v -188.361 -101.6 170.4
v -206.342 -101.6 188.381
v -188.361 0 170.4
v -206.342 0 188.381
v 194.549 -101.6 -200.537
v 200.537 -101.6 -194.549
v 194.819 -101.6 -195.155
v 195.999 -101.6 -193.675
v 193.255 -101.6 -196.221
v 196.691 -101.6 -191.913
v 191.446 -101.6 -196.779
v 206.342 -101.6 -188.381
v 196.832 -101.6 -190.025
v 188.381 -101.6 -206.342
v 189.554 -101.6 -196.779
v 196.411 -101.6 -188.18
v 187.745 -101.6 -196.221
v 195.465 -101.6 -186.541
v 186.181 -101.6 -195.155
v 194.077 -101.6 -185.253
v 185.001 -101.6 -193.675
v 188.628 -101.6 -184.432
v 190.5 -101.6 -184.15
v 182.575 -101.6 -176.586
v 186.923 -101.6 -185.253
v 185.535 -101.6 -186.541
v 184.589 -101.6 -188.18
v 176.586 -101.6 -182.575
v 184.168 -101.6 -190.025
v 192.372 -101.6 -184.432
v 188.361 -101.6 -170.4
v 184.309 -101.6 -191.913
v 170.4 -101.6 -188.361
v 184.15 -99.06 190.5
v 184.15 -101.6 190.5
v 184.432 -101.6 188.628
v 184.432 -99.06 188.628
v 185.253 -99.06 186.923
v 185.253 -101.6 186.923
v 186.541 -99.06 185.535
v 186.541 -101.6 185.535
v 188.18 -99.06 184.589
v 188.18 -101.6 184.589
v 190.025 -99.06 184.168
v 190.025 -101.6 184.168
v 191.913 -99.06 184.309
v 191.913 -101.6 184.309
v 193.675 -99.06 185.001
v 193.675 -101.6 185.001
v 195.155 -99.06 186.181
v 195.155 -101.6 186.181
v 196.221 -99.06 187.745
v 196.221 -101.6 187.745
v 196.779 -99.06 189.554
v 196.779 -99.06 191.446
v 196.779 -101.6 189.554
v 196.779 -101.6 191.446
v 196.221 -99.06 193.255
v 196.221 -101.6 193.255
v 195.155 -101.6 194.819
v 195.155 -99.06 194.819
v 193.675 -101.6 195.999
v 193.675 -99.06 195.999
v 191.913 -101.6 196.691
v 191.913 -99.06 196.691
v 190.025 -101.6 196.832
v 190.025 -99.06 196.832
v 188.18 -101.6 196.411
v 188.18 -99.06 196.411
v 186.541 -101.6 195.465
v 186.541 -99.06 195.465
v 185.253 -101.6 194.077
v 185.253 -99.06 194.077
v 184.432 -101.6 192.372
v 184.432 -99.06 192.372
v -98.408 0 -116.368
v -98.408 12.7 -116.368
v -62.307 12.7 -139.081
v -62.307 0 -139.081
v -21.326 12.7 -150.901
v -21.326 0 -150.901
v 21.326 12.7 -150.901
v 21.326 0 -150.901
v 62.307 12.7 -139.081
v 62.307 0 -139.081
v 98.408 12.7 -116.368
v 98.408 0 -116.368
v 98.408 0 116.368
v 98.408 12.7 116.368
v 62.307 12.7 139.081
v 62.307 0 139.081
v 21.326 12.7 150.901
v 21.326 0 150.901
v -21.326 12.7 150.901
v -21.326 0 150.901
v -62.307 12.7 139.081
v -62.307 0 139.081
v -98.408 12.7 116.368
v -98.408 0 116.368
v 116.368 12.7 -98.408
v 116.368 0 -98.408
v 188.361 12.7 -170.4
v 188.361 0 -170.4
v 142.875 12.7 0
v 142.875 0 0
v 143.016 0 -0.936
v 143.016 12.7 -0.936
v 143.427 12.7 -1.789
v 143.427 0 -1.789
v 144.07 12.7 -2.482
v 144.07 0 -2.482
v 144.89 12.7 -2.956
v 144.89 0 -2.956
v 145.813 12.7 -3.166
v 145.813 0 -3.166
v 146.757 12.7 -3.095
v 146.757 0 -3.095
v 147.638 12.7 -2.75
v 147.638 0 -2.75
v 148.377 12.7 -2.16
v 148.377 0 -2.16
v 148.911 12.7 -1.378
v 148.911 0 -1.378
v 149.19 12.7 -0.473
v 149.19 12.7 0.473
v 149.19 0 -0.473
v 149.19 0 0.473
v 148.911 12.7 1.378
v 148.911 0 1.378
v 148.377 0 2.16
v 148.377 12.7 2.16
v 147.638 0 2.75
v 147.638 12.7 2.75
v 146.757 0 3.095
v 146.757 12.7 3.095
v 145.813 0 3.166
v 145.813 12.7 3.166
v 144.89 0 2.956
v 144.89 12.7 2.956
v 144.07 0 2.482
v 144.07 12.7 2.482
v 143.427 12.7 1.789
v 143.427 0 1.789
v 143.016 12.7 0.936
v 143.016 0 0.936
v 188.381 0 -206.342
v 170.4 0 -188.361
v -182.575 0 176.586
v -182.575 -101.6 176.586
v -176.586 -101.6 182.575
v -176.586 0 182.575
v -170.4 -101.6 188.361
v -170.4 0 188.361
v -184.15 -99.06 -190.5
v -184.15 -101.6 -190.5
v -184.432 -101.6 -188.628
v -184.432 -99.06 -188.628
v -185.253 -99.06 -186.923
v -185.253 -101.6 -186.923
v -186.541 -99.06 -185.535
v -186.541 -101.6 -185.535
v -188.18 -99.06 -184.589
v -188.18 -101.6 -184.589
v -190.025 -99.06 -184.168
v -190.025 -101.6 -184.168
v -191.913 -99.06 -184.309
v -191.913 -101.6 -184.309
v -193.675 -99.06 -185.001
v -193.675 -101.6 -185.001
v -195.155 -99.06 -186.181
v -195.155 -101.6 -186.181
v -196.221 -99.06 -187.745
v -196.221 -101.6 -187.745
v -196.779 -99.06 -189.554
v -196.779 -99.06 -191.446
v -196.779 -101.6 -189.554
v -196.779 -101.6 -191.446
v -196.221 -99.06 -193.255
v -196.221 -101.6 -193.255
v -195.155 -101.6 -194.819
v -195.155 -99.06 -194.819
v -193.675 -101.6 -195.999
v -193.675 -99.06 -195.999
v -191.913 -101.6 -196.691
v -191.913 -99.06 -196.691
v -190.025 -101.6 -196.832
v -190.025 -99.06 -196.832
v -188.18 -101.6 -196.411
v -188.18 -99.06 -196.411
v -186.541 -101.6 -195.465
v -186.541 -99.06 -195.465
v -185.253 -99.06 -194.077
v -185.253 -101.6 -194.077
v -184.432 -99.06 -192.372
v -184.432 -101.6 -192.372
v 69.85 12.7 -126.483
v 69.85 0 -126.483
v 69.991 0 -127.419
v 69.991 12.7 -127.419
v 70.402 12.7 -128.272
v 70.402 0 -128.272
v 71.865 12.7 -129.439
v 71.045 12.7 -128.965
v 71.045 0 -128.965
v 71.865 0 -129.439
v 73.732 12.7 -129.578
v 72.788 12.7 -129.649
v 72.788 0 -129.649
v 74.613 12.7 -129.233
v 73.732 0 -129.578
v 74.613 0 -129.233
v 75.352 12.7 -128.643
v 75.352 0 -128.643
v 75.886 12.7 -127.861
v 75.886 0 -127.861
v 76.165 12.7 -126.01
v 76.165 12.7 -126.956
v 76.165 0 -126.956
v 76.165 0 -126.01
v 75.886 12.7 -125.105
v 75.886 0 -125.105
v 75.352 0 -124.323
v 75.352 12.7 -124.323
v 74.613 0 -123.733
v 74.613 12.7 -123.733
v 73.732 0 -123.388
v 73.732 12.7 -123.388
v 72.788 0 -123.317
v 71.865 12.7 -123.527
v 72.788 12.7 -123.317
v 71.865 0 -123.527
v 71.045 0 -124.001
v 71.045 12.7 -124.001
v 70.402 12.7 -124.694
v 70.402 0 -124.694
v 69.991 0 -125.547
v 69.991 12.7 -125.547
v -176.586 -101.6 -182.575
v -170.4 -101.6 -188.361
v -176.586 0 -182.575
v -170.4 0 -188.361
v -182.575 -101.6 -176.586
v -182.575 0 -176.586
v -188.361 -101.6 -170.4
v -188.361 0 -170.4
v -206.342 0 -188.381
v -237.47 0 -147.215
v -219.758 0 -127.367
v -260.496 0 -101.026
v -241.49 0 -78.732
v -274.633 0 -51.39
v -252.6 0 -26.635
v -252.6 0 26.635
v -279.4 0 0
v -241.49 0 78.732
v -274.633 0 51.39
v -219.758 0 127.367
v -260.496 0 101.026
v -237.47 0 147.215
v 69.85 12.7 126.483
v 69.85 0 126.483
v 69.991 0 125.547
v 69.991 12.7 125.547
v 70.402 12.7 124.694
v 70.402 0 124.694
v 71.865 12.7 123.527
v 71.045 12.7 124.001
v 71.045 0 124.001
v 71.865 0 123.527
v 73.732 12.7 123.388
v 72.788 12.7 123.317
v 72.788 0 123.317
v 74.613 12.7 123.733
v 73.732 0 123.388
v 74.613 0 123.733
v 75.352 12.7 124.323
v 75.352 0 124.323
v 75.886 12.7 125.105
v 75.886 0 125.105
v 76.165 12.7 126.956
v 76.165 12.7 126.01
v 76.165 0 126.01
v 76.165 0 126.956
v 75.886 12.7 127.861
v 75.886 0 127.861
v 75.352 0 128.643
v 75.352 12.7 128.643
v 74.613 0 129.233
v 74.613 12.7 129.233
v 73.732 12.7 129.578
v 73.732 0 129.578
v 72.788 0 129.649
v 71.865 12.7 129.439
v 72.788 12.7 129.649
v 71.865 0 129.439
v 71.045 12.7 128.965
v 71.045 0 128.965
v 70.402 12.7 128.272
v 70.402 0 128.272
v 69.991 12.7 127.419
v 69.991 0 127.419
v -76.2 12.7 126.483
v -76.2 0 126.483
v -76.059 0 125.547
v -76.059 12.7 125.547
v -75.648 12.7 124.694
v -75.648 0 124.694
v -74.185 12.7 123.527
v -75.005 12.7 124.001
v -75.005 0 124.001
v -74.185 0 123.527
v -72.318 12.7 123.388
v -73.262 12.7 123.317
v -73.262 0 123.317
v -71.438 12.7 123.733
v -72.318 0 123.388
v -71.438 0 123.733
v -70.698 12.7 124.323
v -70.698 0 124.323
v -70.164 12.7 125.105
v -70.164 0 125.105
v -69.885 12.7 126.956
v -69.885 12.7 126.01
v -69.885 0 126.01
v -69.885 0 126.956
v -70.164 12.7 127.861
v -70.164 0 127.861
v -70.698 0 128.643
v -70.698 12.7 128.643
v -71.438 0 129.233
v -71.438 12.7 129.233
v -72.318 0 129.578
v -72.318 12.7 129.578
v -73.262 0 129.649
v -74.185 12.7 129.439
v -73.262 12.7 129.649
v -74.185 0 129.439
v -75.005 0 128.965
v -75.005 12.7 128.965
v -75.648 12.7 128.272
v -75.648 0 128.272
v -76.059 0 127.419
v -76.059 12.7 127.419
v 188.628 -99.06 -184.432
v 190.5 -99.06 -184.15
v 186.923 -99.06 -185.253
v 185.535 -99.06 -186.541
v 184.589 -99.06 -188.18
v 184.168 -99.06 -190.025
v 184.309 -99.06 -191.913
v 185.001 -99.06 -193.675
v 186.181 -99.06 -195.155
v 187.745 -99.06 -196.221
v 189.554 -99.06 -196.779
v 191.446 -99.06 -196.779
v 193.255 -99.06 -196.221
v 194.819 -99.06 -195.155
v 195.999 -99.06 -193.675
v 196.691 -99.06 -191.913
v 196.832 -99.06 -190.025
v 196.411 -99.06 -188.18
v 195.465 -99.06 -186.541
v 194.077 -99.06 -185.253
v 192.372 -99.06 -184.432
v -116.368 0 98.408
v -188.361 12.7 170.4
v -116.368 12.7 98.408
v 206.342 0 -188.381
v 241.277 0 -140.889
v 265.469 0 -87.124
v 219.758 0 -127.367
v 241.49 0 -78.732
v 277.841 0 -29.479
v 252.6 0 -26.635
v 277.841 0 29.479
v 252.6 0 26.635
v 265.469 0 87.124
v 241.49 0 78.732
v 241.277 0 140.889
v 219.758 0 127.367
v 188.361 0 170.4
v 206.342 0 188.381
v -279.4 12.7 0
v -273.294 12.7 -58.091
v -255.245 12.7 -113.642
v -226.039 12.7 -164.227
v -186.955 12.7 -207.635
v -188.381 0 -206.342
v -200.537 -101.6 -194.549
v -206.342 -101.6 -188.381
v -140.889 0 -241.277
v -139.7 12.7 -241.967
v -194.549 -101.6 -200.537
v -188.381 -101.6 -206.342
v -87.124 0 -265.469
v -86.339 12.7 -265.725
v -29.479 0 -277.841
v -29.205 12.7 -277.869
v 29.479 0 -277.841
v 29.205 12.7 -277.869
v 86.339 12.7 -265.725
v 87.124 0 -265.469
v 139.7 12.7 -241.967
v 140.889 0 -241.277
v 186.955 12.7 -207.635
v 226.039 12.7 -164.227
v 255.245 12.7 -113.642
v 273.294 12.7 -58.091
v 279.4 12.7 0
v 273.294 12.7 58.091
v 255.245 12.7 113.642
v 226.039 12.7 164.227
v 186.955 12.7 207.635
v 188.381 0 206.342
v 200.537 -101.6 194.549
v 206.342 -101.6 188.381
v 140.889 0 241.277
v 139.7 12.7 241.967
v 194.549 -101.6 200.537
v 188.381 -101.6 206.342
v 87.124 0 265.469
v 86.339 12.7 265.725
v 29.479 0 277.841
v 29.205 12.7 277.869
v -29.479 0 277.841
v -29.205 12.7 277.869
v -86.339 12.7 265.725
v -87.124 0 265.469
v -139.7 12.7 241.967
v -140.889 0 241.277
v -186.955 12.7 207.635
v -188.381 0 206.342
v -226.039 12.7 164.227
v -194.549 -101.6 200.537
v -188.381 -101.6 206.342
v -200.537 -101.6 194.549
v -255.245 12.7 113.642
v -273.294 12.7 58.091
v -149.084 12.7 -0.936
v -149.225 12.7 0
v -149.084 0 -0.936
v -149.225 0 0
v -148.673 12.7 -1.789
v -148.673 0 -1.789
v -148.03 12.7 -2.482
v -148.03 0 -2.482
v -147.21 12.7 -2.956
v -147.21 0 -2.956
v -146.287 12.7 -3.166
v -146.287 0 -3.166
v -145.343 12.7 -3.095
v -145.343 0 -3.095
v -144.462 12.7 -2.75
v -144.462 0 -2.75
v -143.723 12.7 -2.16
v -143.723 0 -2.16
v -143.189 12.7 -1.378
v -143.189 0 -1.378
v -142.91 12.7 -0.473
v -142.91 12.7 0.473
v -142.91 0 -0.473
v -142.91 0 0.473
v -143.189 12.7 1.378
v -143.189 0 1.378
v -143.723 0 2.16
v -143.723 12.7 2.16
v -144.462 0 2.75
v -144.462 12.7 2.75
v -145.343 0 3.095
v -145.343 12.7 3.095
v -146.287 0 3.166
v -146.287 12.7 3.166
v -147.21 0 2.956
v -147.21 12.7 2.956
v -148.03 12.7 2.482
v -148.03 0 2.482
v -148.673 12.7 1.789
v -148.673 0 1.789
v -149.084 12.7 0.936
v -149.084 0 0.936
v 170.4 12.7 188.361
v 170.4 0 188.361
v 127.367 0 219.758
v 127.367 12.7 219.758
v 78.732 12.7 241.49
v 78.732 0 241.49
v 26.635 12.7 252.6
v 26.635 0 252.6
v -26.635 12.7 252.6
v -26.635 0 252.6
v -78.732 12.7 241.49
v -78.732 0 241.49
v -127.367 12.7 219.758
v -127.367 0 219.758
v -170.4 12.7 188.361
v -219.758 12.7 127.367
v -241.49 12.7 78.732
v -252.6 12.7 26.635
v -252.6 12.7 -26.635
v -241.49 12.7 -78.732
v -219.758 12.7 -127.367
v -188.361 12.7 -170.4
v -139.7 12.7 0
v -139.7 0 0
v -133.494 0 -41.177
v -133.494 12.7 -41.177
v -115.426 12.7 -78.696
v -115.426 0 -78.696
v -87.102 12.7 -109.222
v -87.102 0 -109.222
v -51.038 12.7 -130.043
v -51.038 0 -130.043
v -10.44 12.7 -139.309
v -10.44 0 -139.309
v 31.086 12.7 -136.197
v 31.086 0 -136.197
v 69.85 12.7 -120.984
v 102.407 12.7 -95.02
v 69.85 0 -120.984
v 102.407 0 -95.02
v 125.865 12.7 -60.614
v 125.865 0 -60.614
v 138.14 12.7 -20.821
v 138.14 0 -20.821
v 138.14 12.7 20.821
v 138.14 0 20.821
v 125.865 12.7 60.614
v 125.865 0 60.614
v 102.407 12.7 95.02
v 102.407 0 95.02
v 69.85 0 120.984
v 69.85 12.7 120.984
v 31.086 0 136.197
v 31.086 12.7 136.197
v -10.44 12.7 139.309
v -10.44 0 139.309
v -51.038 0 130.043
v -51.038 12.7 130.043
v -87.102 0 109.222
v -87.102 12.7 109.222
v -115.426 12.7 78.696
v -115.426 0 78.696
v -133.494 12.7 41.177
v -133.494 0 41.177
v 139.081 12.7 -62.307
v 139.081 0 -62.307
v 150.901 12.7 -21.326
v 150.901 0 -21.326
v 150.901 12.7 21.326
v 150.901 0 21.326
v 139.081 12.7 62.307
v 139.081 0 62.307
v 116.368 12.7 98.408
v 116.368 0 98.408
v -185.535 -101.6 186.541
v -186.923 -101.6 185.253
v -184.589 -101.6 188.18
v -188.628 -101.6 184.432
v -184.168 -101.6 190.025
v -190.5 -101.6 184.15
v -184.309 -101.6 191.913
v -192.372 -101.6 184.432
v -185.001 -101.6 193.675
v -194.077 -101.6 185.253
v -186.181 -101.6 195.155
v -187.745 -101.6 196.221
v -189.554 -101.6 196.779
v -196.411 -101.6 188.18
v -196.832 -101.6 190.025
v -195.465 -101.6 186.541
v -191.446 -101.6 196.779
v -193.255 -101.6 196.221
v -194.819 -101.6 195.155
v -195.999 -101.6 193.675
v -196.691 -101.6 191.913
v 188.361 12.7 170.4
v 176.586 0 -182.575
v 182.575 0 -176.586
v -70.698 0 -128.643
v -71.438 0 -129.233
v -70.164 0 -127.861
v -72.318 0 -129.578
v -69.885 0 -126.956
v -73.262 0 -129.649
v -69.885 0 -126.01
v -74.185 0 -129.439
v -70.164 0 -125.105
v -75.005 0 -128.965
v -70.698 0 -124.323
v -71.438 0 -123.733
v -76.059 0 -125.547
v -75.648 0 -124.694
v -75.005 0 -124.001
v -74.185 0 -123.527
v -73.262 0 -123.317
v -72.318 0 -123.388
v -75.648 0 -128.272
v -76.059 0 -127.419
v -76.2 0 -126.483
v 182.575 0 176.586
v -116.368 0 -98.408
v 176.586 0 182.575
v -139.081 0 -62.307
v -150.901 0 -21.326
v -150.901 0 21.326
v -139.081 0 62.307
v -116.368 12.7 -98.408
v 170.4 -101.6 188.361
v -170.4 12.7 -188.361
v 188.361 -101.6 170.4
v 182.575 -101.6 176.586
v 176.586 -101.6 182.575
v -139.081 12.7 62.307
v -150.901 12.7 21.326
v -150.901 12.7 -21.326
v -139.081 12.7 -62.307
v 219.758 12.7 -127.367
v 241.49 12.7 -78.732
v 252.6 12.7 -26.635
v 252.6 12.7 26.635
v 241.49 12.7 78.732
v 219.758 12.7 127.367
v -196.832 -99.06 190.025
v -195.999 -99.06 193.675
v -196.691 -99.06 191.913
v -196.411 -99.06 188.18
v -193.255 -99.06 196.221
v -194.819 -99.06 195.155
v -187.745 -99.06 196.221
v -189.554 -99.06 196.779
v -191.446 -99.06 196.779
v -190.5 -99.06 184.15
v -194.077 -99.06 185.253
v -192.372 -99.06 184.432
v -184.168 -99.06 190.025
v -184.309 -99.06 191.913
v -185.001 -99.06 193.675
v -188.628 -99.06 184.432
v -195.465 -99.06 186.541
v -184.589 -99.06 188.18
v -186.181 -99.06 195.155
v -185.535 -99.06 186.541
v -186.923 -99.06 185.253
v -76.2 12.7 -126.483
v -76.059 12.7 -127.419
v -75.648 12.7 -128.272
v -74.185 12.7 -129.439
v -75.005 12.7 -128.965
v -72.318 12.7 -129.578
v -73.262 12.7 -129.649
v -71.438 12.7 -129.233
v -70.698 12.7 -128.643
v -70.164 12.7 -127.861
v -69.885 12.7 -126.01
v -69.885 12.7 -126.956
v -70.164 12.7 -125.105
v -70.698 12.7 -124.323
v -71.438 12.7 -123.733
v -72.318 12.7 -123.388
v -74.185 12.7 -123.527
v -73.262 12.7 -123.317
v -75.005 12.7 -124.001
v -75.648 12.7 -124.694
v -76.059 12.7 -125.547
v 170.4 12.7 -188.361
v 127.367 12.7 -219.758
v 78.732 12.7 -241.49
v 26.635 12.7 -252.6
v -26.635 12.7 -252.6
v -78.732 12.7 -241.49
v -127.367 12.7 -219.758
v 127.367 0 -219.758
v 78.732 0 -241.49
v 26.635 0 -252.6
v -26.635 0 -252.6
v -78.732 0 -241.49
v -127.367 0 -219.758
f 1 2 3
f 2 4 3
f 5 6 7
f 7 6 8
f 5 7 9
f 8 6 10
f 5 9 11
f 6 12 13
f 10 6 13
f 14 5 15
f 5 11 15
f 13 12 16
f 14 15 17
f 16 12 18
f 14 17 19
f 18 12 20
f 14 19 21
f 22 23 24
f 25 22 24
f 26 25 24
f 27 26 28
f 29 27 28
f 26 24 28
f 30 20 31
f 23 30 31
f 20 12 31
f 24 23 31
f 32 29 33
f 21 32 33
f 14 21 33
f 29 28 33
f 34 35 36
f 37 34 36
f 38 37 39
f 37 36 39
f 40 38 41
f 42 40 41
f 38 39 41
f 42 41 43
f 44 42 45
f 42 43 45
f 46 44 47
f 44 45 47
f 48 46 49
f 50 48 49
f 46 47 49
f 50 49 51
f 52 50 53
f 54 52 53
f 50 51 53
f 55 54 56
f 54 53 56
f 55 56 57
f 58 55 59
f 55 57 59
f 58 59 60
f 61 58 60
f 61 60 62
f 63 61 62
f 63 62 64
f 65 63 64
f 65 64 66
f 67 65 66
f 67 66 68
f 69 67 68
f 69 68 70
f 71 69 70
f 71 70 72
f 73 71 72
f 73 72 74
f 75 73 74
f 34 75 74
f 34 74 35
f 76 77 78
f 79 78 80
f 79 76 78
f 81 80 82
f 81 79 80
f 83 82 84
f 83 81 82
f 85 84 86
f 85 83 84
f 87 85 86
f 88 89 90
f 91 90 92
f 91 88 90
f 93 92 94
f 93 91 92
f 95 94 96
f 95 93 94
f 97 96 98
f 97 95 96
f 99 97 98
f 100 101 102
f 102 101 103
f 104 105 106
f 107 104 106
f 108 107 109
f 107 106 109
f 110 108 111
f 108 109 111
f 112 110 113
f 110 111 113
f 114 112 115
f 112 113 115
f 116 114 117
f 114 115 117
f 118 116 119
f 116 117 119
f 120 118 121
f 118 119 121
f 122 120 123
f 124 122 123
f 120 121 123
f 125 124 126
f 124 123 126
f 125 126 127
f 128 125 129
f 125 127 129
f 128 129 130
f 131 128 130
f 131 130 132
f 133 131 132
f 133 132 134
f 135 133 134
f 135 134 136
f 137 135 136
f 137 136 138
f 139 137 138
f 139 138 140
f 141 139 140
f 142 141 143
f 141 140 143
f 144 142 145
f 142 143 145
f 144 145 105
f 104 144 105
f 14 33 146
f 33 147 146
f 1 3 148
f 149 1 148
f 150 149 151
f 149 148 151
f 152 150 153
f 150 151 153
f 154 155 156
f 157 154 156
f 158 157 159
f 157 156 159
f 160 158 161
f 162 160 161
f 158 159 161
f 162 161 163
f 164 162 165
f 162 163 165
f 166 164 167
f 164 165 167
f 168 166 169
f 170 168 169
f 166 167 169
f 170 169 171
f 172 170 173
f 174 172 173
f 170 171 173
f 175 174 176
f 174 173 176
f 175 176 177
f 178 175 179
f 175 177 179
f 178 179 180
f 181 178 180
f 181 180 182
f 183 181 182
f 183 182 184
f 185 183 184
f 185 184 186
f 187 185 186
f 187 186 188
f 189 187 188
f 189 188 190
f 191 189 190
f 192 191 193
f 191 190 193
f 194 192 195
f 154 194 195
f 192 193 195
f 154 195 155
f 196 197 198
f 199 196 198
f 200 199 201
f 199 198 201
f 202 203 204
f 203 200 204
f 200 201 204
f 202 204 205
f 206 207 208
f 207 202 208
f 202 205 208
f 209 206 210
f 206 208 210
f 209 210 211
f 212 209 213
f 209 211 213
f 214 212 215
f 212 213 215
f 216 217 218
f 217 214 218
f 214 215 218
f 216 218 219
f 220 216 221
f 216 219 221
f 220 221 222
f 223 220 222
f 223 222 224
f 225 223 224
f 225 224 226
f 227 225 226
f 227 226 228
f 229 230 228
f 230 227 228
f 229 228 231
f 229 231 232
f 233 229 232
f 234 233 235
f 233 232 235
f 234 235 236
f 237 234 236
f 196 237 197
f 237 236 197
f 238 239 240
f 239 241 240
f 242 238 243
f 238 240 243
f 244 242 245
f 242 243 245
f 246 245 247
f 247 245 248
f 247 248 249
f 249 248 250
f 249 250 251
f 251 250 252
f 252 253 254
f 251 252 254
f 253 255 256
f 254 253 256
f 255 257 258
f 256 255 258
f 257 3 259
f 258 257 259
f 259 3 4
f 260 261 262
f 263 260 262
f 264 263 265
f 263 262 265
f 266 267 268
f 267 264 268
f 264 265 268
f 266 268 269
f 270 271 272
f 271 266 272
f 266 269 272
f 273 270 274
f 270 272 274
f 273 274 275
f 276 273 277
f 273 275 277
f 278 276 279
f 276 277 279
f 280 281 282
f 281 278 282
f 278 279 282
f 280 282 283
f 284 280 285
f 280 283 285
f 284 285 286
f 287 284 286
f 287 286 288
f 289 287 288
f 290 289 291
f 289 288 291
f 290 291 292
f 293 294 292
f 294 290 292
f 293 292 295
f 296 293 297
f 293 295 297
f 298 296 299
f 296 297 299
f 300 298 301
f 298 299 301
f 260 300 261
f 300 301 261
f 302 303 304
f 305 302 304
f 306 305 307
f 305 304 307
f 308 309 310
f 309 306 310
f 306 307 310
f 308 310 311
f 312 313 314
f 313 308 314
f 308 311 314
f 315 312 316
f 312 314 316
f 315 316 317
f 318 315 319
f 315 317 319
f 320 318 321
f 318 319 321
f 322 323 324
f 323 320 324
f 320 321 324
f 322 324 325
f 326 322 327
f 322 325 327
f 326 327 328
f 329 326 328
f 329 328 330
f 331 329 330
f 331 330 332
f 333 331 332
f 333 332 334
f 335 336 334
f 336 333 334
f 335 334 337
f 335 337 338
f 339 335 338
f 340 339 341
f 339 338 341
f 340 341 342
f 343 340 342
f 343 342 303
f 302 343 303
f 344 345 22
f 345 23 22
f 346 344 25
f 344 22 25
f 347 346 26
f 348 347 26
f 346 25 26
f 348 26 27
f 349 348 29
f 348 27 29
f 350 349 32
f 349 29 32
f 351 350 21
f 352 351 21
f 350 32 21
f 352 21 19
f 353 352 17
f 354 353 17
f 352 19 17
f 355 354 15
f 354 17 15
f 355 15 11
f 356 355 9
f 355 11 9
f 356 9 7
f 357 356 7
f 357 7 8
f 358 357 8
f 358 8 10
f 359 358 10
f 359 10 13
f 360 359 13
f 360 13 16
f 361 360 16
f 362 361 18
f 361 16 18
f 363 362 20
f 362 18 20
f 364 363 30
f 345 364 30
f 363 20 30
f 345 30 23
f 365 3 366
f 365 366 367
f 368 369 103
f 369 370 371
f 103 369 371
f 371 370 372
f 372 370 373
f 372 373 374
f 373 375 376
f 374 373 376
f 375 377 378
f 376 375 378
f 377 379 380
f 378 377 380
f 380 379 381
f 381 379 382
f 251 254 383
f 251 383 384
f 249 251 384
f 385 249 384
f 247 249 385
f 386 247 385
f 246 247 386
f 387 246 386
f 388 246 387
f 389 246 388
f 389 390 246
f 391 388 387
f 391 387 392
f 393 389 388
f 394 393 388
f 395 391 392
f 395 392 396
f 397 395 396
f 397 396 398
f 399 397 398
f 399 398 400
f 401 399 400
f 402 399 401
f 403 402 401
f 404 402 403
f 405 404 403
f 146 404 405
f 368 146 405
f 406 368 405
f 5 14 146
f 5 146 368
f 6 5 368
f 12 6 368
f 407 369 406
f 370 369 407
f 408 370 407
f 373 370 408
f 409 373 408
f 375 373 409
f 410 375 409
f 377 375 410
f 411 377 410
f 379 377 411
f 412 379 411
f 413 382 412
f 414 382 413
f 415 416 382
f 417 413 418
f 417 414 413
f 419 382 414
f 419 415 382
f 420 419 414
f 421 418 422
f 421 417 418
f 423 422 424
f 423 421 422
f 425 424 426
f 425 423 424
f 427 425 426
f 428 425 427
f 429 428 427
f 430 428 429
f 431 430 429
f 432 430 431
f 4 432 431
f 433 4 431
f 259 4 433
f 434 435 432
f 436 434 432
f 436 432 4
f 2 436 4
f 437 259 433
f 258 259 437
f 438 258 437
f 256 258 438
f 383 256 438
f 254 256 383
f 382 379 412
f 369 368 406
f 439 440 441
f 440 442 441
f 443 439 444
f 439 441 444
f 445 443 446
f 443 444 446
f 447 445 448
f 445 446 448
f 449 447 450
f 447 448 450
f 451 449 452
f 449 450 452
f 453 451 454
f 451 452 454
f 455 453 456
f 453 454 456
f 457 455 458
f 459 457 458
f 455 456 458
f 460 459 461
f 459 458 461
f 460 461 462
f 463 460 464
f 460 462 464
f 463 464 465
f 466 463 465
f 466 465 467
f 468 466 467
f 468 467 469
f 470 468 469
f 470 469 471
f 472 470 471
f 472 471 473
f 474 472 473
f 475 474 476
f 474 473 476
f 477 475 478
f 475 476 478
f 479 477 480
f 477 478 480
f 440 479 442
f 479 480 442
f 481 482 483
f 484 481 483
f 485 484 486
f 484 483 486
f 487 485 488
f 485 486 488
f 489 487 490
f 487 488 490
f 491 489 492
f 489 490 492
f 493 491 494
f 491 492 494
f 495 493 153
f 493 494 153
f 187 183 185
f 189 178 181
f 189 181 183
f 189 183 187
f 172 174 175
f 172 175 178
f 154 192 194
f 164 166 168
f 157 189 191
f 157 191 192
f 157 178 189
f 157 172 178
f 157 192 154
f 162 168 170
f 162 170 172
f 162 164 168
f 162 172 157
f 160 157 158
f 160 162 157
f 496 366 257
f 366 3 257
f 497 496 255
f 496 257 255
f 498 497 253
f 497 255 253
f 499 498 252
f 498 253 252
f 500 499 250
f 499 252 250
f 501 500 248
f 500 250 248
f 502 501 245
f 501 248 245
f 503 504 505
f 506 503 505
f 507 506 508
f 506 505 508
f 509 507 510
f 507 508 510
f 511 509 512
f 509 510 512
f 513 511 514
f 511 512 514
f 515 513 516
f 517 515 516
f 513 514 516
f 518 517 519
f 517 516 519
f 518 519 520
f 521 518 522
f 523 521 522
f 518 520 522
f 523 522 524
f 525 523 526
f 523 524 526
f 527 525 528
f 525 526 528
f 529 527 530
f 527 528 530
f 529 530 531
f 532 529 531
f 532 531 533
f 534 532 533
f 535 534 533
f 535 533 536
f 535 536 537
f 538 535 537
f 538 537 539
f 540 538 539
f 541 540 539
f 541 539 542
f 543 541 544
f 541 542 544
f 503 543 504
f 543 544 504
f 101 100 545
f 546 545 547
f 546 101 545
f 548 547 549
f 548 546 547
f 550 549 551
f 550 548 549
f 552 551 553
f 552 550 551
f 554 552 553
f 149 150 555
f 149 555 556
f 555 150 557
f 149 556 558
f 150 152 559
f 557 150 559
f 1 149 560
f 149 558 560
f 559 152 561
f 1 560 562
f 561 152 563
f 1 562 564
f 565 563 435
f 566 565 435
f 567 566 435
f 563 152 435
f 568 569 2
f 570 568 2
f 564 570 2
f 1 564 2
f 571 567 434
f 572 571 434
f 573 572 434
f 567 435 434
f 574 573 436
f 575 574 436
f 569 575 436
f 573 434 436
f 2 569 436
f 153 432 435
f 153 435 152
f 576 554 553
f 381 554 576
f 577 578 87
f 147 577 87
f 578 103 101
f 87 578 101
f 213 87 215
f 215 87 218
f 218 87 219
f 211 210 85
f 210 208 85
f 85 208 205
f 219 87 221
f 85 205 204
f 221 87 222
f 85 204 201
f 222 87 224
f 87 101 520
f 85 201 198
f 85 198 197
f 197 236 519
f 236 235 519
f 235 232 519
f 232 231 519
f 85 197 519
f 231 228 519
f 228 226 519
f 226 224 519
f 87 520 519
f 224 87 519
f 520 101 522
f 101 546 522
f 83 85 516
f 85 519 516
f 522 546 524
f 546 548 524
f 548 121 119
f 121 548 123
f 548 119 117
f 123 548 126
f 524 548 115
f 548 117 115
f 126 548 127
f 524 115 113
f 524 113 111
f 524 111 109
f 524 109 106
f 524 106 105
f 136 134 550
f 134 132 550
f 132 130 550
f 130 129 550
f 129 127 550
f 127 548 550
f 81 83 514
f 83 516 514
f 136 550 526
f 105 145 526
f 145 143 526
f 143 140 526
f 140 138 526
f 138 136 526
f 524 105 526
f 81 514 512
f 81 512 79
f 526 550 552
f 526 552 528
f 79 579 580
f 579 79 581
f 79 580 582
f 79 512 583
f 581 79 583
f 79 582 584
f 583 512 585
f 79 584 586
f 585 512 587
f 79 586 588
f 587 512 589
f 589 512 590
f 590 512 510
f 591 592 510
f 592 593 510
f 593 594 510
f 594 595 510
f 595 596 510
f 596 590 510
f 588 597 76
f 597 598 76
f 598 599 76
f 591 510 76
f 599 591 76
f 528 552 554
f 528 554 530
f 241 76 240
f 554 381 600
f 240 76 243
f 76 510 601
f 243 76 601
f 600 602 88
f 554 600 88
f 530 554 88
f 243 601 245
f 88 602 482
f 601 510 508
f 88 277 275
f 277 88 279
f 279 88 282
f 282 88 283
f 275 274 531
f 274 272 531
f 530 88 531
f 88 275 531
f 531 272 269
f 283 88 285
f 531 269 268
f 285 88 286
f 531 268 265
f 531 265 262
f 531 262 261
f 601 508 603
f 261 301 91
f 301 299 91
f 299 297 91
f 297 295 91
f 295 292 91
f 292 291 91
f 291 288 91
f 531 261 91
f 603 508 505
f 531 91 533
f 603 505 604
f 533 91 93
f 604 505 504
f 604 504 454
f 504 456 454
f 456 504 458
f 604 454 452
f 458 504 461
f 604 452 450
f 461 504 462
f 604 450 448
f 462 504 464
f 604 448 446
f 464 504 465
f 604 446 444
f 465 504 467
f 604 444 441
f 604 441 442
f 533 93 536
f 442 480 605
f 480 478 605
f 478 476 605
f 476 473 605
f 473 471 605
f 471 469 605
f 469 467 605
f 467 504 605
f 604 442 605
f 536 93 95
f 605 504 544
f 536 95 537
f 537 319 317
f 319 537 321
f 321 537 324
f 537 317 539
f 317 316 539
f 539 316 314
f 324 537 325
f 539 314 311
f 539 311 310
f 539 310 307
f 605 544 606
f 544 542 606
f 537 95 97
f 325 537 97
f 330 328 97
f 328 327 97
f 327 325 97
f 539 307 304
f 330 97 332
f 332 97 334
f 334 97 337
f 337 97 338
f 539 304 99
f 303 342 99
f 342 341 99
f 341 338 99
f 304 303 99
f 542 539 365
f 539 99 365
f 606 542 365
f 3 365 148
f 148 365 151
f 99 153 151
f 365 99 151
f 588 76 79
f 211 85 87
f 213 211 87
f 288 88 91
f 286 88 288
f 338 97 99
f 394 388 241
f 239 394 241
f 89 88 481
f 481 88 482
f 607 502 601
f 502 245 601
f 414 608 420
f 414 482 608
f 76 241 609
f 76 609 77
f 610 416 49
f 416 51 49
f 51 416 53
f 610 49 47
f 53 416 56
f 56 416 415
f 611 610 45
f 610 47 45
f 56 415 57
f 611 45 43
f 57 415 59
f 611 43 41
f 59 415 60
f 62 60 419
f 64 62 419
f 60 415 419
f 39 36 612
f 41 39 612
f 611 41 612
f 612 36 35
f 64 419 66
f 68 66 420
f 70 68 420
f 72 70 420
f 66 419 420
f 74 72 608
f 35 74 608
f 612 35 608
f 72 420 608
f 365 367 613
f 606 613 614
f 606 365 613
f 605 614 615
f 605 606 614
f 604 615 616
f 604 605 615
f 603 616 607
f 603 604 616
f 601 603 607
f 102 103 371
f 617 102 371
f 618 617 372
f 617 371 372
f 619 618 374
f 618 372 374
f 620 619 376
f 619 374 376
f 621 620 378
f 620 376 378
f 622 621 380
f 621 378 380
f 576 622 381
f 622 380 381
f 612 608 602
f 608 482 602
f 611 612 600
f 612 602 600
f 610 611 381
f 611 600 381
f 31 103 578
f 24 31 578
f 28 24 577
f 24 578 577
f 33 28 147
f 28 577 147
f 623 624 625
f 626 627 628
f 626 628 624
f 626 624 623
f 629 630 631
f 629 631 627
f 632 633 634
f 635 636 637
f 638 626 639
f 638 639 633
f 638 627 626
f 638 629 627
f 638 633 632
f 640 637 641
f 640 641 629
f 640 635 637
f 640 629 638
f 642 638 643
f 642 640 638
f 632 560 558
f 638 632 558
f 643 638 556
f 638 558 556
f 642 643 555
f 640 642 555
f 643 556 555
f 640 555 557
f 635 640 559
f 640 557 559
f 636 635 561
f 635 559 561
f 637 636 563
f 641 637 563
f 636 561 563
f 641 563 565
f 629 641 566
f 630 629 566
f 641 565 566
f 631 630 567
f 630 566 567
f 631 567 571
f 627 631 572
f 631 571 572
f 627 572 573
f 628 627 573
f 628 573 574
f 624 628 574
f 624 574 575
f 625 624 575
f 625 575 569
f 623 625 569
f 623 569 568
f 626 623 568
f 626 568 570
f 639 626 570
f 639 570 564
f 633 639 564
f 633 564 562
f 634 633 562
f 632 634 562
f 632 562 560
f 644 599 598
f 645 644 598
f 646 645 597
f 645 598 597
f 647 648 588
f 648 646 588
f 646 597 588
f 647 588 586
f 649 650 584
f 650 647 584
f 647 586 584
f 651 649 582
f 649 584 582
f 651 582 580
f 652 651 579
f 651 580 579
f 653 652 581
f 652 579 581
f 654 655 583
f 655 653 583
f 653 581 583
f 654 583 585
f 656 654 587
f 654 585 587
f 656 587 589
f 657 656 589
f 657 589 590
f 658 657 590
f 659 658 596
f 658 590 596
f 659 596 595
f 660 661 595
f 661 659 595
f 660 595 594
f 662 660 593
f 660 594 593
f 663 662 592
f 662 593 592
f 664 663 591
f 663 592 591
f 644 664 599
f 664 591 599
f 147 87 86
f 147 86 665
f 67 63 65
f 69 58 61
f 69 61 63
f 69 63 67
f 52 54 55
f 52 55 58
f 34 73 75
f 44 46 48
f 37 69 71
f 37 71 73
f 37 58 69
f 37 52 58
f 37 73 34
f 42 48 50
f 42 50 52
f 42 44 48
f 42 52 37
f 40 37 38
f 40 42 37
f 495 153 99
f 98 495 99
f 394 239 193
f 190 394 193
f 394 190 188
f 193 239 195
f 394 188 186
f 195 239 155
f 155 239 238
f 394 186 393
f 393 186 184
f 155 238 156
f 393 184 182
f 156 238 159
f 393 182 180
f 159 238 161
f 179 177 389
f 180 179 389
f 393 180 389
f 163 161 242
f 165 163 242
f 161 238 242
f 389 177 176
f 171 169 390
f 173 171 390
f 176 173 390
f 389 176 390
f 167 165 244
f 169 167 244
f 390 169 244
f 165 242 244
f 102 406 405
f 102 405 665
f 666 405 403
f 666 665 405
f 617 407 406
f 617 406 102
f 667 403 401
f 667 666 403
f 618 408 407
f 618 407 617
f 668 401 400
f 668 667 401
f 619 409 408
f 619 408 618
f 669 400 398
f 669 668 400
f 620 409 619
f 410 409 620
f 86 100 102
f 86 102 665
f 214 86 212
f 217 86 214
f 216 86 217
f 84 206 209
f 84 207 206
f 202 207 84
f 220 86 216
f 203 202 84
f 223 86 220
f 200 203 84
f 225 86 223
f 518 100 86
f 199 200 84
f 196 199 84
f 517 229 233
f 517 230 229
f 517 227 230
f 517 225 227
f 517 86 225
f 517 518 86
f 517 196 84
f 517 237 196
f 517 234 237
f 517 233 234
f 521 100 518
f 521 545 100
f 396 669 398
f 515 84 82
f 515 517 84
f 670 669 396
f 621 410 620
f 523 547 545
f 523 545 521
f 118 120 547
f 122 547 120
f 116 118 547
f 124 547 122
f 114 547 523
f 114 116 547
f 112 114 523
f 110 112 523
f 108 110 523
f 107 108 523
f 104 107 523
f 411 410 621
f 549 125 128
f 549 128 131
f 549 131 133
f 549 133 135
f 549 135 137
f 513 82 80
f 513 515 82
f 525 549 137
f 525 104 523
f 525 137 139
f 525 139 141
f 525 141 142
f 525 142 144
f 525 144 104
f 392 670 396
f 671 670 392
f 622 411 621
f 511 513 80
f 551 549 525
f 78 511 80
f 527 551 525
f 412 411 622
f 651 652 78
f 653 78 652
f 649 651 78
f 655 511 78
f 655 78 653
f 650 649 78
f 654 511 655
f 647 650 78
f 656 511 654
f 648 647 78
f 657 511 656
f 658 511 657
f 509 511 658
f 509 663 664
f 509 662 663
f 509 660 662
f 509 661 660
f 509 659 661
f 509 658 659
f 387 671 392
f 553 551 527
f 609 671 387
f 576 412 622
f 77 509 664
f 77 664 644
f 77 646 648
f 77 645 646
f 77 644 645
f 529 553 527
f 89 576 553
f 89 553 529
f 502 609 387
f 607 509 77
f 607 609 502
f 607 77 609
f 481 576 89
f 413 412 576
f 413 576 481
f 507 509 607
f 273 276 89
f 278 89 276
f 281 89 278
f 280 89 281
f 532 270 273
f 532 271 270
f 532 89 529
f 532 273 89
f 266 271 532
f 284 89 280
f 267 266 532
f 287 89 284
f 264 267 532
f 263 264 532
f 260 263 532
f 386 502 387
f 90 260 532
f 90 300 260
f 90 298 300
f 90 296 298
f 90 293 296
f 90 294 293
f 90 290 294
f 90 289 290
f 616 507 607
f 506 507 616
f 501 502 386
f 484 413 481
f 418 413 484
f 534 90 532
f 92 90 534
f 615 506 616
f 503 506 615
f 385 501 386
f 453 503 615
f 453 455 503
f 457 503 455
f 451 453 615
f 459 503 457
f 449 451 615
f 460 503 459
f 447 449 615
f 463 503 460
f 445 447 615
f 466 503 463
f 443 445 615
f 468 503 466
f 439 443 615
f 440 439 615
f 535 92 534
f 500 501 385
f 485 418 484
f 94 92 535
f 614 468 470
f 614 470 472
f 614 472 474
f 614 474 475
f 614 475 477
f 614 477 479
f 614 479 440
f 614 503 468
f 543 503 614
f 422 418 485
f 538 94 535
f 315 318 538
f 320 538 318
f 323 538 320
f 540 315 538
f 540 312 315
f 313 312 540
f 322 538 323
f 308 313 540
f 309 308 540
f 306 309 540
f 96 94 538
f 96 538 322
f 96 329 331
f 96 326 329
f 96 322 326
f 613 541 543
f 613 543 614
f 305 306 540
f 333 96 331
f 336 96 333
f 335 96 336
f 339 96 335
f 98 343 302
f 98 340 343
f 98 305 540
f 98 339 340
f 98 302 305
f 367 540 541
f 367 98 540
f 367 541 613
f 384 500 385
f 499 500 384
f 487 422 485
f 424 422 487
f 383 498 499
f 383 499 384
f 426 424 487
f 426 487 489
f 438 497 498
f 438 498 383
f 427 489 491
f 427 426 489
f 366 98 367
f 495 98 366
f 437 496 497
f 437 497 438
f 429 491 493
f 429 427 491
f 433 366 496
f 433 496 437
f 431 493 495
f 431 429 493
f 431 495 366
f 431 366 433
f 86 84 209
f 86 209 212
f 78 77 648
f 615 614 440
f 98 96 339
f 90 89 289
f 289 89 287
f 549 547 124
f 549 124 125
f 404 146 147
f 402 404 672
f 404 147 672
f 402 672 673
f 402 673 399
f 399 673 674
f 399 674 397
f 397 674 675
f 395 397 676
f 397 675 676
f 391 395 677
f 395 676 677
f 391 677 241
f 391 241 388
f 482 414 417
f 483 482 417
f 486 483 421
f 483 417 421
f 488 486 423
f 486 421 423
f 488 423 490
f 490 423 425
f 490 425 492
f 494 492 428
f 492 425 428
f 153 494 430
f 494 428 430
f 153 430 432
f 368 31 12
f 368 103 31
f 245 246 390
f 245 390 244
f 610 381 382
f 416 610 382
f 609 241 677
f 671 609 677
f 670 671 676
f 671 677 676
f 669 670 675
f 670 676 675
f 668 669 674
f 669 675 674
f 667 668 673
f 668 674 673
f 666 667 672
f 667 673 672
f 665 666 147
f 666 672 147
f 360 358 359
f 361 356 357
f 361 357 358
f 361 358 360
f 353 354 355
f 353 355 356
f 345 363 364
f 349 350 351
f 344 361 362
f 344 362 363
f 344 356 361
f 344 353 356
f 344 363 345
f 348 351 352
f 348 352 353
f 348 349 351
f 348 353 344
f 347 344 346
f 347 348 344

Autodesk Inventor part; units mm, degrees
ref_plane "YZ Plane" through (0, 0, 0) normal (1, 0, 0) x (0, 1, 0)
ref_plane "XZ Plane" through (0, 0, 0) normal (0, 1, 0) x (-1, 0, 0)
ref_plane "XY Plane" through (0, 0, 0) normal (0, 0, 1) x (1, 0, 0)
sketch "Sketch1" plane through (0, 0, 0) normal (0, 1, 0) x (-1, 0, 0)
  circle A0 centre (0, 0) radius 254
  circle A1 centre (0, 0) radius 279.4
  line L0 (0, 279.4) -> (0, -279.4)
  line L1 (-279.4, 0) -> (279.4, 0)
  line L2 (197.5656, -197.5656) -> (-197.5656, 197.5656)
  line L3 (197.5656, 197.5656) -> (-197.5656, -197.5656)
  line L4 (206.5459, -188.5854) -> (-188.5854, 206.5459)
  line L5 (188.5854, -206.5459) -> (-206.5459, 188.5854)
  line L6 (188.5854, 206.5459) -> (-206.5459, -188.5854)
  line L7 (206.5459, 188.5854) -> (-188.5854, -206.5459)
  circle A2 centre (0, 0) radius 152.4
  circle A3 centre (0, 0) radius 101.6
  circle A4 centre (0, 0) radius 88.9
  circle A5 centre (0, 0) radius 139.7
  circle A6 centre (146.05, 0) radius 3.175
  circle A7 centre (73.025, 126.483) radius 3.175
  circle A8 centre (-73.025, 126.483) radius 3.175
  circle A9 centre (-146.05, 0) radius 3.175
  circle A10 centre (-73.025, -126.483) radius 3.175
  circle A11 centre (73.025, -126.483) radius 3.175
  circle A12 centre (95.25, 0) radius 3.175
  circle A13 centre (47.625, 82.4889) radius 3.175
  circle A14 centre (-47.625, 82.4889) radius 3.175
  circle A15 centre (-95.25, 0) radius 3.175
  circle A16 centre (-47.625, -82.4889) radius 3.175
  circle A17 centre (47.625, -82.4889) radius 3.175
  circle A18 centre (0, 0) radius 284.48
  point P0 (-170.4002, -188.3607)
  point P1 (-98.408, -116.3685)
  point P2 (98.408, -116.3685)
  point P3 (170.4002, -188.3607)
  point P4 (-188.3607, 170.4002)
  point P5 (-116.3685, 98.408)
  point P6 (-116.3685, -98.408)
  point P7 (-188.3607, -170.4002)
  point P8 (-170.4002, 188.3607)
  point P9 (170.4002, 188.3607)
  point P10 (98.408, 116.3685)
  point P11 (-98.408, 116.3685)
  point P12 (188.3607, -170.4002)
  point P13 (116.3685, -98.408)
  point P14 (116.3685, 98.408)
  point P15 (188.3607, 170.4002)
  point P16 (188.3812, 206.3417)
  point P17 (206.3417, 188.3812)
  point P18 (188.3812, -206.3417)
  point P19 (206.3417, -188.3812)
  point P20 (-206.3417, -188.3812)
  point P21 (-188.3812, -206.3417)
  point P22 (-188.3812, 206.3417)
  point P23 (-206.3417, 188.3812)
  dimension "d36" = 4
  dimension "d0" = 508
  dimension "d1" = 25.4
  dimension "d2" = 45
  dimension "d3" = 0
  dimension "d4" = 0
  dimension "d5" = 45
  dimension "d6" = 12.7
  dimension "d7" = 12.7
  dimension "d8" = 12.7
  dimension "d9" = 12.7
  dimension "d10" = 304.8
  dimension "d11" = 203.2
  dimension "d12" = 177.8
  dimension "d13" = 12.7
  dimension "d14" = 6.35
  dimension "d15" = 146.05
  dimension "d18" = 360
  dimension "d20" = 6.35
  dimension "d21" = 95.25
  dimension "d24" = 360
  dimension "d26" = 5.08
extrude "Extrusion1" add sketch "Sketch1" along normal blind 12.7 contours L1 A1 L4 A0 | A0 L7 A1 L1 | L7 A2 L3 A0 | A0 L3 A1 L7 | L4 A1 L2 A0 | A0 L2 A2 L4 | A2 L4 A5 L1 A6 | L1 A6 A5 L7 A2 | L3 A2 L6 A0 | A0 L6 A1 L3 | L7 A5 L3 A2 | L2 A1 L5 A0 | A0 L5 A2 L2 | A2 L2 A5 L4 | A0 L0 A1 L6 | L3 A5 L6 A2 | L5 A1 L0 A0 | A2 L5 A5 L2 | A0 L4 A1 L0 | L6 A5 L0 A2 | L0 A1 L7 A0 | A2 L0 A5 L5 | L4 A2 L2 A0 | A0 L2 A1 L4 | L0 A5 L4 A2 | L7 A1 L3 A0 | A0 L3 A2 L7 | A2 L7 A5 L0 | L2 A2 L5 A0 | A0 L5 A1 L2 | L4 A5 L2 A2 | L3 A1 L6 A0 | A0 L6 A2 L3 | A2 L3 A5 L7 | A0 L1 A1 L5 | L2 A5 L5 A2 | L6 A1 L1 A0 | A2 L6 A5 L3 | L5 A5 L1 A9 A2 | A2 L1 A9 A5 L6
extrude "Extrusion2" add sketch "Sketch1" against normal blind 101.6 contours A0 L3 A1 L7 | L4 A1 L2 A0 | A0 L6 A1 L3 | L2 A1 L5 A0 | A0 L2 A1 L4 | L7 A1 L3 A0 | A0 L5 A1 L2 | L3 A1 L6 A0
sketch "Sketch2" plane through (0, -101.6, 0) normal (0, -1, 0) x (1, 0, 0)
  circle A0 centre (-190.5, -190.5) radius 6.35
  line L0 (-188.3607, -170.4002) -> (-206.3417, -188.3812) projected
  arc A1 (-206.3417, -188.3812) -> (-188.3812, -206.3417) centre (0, 0) ccw projected
  dimension "d31" = 12.7
  dimension "d32" = 12.7
  dimension "d33" = 190.5
extrude "Extrusion3" cut sketch "Sketch2" against normal blind 2.54
pattern_circular "Circular Pattern1" count 4 over 360 about axis through (0, 0, 0) along (0, 1, 0) of "Extrusion3"
properties part number "Lazy suzan lower frame"
